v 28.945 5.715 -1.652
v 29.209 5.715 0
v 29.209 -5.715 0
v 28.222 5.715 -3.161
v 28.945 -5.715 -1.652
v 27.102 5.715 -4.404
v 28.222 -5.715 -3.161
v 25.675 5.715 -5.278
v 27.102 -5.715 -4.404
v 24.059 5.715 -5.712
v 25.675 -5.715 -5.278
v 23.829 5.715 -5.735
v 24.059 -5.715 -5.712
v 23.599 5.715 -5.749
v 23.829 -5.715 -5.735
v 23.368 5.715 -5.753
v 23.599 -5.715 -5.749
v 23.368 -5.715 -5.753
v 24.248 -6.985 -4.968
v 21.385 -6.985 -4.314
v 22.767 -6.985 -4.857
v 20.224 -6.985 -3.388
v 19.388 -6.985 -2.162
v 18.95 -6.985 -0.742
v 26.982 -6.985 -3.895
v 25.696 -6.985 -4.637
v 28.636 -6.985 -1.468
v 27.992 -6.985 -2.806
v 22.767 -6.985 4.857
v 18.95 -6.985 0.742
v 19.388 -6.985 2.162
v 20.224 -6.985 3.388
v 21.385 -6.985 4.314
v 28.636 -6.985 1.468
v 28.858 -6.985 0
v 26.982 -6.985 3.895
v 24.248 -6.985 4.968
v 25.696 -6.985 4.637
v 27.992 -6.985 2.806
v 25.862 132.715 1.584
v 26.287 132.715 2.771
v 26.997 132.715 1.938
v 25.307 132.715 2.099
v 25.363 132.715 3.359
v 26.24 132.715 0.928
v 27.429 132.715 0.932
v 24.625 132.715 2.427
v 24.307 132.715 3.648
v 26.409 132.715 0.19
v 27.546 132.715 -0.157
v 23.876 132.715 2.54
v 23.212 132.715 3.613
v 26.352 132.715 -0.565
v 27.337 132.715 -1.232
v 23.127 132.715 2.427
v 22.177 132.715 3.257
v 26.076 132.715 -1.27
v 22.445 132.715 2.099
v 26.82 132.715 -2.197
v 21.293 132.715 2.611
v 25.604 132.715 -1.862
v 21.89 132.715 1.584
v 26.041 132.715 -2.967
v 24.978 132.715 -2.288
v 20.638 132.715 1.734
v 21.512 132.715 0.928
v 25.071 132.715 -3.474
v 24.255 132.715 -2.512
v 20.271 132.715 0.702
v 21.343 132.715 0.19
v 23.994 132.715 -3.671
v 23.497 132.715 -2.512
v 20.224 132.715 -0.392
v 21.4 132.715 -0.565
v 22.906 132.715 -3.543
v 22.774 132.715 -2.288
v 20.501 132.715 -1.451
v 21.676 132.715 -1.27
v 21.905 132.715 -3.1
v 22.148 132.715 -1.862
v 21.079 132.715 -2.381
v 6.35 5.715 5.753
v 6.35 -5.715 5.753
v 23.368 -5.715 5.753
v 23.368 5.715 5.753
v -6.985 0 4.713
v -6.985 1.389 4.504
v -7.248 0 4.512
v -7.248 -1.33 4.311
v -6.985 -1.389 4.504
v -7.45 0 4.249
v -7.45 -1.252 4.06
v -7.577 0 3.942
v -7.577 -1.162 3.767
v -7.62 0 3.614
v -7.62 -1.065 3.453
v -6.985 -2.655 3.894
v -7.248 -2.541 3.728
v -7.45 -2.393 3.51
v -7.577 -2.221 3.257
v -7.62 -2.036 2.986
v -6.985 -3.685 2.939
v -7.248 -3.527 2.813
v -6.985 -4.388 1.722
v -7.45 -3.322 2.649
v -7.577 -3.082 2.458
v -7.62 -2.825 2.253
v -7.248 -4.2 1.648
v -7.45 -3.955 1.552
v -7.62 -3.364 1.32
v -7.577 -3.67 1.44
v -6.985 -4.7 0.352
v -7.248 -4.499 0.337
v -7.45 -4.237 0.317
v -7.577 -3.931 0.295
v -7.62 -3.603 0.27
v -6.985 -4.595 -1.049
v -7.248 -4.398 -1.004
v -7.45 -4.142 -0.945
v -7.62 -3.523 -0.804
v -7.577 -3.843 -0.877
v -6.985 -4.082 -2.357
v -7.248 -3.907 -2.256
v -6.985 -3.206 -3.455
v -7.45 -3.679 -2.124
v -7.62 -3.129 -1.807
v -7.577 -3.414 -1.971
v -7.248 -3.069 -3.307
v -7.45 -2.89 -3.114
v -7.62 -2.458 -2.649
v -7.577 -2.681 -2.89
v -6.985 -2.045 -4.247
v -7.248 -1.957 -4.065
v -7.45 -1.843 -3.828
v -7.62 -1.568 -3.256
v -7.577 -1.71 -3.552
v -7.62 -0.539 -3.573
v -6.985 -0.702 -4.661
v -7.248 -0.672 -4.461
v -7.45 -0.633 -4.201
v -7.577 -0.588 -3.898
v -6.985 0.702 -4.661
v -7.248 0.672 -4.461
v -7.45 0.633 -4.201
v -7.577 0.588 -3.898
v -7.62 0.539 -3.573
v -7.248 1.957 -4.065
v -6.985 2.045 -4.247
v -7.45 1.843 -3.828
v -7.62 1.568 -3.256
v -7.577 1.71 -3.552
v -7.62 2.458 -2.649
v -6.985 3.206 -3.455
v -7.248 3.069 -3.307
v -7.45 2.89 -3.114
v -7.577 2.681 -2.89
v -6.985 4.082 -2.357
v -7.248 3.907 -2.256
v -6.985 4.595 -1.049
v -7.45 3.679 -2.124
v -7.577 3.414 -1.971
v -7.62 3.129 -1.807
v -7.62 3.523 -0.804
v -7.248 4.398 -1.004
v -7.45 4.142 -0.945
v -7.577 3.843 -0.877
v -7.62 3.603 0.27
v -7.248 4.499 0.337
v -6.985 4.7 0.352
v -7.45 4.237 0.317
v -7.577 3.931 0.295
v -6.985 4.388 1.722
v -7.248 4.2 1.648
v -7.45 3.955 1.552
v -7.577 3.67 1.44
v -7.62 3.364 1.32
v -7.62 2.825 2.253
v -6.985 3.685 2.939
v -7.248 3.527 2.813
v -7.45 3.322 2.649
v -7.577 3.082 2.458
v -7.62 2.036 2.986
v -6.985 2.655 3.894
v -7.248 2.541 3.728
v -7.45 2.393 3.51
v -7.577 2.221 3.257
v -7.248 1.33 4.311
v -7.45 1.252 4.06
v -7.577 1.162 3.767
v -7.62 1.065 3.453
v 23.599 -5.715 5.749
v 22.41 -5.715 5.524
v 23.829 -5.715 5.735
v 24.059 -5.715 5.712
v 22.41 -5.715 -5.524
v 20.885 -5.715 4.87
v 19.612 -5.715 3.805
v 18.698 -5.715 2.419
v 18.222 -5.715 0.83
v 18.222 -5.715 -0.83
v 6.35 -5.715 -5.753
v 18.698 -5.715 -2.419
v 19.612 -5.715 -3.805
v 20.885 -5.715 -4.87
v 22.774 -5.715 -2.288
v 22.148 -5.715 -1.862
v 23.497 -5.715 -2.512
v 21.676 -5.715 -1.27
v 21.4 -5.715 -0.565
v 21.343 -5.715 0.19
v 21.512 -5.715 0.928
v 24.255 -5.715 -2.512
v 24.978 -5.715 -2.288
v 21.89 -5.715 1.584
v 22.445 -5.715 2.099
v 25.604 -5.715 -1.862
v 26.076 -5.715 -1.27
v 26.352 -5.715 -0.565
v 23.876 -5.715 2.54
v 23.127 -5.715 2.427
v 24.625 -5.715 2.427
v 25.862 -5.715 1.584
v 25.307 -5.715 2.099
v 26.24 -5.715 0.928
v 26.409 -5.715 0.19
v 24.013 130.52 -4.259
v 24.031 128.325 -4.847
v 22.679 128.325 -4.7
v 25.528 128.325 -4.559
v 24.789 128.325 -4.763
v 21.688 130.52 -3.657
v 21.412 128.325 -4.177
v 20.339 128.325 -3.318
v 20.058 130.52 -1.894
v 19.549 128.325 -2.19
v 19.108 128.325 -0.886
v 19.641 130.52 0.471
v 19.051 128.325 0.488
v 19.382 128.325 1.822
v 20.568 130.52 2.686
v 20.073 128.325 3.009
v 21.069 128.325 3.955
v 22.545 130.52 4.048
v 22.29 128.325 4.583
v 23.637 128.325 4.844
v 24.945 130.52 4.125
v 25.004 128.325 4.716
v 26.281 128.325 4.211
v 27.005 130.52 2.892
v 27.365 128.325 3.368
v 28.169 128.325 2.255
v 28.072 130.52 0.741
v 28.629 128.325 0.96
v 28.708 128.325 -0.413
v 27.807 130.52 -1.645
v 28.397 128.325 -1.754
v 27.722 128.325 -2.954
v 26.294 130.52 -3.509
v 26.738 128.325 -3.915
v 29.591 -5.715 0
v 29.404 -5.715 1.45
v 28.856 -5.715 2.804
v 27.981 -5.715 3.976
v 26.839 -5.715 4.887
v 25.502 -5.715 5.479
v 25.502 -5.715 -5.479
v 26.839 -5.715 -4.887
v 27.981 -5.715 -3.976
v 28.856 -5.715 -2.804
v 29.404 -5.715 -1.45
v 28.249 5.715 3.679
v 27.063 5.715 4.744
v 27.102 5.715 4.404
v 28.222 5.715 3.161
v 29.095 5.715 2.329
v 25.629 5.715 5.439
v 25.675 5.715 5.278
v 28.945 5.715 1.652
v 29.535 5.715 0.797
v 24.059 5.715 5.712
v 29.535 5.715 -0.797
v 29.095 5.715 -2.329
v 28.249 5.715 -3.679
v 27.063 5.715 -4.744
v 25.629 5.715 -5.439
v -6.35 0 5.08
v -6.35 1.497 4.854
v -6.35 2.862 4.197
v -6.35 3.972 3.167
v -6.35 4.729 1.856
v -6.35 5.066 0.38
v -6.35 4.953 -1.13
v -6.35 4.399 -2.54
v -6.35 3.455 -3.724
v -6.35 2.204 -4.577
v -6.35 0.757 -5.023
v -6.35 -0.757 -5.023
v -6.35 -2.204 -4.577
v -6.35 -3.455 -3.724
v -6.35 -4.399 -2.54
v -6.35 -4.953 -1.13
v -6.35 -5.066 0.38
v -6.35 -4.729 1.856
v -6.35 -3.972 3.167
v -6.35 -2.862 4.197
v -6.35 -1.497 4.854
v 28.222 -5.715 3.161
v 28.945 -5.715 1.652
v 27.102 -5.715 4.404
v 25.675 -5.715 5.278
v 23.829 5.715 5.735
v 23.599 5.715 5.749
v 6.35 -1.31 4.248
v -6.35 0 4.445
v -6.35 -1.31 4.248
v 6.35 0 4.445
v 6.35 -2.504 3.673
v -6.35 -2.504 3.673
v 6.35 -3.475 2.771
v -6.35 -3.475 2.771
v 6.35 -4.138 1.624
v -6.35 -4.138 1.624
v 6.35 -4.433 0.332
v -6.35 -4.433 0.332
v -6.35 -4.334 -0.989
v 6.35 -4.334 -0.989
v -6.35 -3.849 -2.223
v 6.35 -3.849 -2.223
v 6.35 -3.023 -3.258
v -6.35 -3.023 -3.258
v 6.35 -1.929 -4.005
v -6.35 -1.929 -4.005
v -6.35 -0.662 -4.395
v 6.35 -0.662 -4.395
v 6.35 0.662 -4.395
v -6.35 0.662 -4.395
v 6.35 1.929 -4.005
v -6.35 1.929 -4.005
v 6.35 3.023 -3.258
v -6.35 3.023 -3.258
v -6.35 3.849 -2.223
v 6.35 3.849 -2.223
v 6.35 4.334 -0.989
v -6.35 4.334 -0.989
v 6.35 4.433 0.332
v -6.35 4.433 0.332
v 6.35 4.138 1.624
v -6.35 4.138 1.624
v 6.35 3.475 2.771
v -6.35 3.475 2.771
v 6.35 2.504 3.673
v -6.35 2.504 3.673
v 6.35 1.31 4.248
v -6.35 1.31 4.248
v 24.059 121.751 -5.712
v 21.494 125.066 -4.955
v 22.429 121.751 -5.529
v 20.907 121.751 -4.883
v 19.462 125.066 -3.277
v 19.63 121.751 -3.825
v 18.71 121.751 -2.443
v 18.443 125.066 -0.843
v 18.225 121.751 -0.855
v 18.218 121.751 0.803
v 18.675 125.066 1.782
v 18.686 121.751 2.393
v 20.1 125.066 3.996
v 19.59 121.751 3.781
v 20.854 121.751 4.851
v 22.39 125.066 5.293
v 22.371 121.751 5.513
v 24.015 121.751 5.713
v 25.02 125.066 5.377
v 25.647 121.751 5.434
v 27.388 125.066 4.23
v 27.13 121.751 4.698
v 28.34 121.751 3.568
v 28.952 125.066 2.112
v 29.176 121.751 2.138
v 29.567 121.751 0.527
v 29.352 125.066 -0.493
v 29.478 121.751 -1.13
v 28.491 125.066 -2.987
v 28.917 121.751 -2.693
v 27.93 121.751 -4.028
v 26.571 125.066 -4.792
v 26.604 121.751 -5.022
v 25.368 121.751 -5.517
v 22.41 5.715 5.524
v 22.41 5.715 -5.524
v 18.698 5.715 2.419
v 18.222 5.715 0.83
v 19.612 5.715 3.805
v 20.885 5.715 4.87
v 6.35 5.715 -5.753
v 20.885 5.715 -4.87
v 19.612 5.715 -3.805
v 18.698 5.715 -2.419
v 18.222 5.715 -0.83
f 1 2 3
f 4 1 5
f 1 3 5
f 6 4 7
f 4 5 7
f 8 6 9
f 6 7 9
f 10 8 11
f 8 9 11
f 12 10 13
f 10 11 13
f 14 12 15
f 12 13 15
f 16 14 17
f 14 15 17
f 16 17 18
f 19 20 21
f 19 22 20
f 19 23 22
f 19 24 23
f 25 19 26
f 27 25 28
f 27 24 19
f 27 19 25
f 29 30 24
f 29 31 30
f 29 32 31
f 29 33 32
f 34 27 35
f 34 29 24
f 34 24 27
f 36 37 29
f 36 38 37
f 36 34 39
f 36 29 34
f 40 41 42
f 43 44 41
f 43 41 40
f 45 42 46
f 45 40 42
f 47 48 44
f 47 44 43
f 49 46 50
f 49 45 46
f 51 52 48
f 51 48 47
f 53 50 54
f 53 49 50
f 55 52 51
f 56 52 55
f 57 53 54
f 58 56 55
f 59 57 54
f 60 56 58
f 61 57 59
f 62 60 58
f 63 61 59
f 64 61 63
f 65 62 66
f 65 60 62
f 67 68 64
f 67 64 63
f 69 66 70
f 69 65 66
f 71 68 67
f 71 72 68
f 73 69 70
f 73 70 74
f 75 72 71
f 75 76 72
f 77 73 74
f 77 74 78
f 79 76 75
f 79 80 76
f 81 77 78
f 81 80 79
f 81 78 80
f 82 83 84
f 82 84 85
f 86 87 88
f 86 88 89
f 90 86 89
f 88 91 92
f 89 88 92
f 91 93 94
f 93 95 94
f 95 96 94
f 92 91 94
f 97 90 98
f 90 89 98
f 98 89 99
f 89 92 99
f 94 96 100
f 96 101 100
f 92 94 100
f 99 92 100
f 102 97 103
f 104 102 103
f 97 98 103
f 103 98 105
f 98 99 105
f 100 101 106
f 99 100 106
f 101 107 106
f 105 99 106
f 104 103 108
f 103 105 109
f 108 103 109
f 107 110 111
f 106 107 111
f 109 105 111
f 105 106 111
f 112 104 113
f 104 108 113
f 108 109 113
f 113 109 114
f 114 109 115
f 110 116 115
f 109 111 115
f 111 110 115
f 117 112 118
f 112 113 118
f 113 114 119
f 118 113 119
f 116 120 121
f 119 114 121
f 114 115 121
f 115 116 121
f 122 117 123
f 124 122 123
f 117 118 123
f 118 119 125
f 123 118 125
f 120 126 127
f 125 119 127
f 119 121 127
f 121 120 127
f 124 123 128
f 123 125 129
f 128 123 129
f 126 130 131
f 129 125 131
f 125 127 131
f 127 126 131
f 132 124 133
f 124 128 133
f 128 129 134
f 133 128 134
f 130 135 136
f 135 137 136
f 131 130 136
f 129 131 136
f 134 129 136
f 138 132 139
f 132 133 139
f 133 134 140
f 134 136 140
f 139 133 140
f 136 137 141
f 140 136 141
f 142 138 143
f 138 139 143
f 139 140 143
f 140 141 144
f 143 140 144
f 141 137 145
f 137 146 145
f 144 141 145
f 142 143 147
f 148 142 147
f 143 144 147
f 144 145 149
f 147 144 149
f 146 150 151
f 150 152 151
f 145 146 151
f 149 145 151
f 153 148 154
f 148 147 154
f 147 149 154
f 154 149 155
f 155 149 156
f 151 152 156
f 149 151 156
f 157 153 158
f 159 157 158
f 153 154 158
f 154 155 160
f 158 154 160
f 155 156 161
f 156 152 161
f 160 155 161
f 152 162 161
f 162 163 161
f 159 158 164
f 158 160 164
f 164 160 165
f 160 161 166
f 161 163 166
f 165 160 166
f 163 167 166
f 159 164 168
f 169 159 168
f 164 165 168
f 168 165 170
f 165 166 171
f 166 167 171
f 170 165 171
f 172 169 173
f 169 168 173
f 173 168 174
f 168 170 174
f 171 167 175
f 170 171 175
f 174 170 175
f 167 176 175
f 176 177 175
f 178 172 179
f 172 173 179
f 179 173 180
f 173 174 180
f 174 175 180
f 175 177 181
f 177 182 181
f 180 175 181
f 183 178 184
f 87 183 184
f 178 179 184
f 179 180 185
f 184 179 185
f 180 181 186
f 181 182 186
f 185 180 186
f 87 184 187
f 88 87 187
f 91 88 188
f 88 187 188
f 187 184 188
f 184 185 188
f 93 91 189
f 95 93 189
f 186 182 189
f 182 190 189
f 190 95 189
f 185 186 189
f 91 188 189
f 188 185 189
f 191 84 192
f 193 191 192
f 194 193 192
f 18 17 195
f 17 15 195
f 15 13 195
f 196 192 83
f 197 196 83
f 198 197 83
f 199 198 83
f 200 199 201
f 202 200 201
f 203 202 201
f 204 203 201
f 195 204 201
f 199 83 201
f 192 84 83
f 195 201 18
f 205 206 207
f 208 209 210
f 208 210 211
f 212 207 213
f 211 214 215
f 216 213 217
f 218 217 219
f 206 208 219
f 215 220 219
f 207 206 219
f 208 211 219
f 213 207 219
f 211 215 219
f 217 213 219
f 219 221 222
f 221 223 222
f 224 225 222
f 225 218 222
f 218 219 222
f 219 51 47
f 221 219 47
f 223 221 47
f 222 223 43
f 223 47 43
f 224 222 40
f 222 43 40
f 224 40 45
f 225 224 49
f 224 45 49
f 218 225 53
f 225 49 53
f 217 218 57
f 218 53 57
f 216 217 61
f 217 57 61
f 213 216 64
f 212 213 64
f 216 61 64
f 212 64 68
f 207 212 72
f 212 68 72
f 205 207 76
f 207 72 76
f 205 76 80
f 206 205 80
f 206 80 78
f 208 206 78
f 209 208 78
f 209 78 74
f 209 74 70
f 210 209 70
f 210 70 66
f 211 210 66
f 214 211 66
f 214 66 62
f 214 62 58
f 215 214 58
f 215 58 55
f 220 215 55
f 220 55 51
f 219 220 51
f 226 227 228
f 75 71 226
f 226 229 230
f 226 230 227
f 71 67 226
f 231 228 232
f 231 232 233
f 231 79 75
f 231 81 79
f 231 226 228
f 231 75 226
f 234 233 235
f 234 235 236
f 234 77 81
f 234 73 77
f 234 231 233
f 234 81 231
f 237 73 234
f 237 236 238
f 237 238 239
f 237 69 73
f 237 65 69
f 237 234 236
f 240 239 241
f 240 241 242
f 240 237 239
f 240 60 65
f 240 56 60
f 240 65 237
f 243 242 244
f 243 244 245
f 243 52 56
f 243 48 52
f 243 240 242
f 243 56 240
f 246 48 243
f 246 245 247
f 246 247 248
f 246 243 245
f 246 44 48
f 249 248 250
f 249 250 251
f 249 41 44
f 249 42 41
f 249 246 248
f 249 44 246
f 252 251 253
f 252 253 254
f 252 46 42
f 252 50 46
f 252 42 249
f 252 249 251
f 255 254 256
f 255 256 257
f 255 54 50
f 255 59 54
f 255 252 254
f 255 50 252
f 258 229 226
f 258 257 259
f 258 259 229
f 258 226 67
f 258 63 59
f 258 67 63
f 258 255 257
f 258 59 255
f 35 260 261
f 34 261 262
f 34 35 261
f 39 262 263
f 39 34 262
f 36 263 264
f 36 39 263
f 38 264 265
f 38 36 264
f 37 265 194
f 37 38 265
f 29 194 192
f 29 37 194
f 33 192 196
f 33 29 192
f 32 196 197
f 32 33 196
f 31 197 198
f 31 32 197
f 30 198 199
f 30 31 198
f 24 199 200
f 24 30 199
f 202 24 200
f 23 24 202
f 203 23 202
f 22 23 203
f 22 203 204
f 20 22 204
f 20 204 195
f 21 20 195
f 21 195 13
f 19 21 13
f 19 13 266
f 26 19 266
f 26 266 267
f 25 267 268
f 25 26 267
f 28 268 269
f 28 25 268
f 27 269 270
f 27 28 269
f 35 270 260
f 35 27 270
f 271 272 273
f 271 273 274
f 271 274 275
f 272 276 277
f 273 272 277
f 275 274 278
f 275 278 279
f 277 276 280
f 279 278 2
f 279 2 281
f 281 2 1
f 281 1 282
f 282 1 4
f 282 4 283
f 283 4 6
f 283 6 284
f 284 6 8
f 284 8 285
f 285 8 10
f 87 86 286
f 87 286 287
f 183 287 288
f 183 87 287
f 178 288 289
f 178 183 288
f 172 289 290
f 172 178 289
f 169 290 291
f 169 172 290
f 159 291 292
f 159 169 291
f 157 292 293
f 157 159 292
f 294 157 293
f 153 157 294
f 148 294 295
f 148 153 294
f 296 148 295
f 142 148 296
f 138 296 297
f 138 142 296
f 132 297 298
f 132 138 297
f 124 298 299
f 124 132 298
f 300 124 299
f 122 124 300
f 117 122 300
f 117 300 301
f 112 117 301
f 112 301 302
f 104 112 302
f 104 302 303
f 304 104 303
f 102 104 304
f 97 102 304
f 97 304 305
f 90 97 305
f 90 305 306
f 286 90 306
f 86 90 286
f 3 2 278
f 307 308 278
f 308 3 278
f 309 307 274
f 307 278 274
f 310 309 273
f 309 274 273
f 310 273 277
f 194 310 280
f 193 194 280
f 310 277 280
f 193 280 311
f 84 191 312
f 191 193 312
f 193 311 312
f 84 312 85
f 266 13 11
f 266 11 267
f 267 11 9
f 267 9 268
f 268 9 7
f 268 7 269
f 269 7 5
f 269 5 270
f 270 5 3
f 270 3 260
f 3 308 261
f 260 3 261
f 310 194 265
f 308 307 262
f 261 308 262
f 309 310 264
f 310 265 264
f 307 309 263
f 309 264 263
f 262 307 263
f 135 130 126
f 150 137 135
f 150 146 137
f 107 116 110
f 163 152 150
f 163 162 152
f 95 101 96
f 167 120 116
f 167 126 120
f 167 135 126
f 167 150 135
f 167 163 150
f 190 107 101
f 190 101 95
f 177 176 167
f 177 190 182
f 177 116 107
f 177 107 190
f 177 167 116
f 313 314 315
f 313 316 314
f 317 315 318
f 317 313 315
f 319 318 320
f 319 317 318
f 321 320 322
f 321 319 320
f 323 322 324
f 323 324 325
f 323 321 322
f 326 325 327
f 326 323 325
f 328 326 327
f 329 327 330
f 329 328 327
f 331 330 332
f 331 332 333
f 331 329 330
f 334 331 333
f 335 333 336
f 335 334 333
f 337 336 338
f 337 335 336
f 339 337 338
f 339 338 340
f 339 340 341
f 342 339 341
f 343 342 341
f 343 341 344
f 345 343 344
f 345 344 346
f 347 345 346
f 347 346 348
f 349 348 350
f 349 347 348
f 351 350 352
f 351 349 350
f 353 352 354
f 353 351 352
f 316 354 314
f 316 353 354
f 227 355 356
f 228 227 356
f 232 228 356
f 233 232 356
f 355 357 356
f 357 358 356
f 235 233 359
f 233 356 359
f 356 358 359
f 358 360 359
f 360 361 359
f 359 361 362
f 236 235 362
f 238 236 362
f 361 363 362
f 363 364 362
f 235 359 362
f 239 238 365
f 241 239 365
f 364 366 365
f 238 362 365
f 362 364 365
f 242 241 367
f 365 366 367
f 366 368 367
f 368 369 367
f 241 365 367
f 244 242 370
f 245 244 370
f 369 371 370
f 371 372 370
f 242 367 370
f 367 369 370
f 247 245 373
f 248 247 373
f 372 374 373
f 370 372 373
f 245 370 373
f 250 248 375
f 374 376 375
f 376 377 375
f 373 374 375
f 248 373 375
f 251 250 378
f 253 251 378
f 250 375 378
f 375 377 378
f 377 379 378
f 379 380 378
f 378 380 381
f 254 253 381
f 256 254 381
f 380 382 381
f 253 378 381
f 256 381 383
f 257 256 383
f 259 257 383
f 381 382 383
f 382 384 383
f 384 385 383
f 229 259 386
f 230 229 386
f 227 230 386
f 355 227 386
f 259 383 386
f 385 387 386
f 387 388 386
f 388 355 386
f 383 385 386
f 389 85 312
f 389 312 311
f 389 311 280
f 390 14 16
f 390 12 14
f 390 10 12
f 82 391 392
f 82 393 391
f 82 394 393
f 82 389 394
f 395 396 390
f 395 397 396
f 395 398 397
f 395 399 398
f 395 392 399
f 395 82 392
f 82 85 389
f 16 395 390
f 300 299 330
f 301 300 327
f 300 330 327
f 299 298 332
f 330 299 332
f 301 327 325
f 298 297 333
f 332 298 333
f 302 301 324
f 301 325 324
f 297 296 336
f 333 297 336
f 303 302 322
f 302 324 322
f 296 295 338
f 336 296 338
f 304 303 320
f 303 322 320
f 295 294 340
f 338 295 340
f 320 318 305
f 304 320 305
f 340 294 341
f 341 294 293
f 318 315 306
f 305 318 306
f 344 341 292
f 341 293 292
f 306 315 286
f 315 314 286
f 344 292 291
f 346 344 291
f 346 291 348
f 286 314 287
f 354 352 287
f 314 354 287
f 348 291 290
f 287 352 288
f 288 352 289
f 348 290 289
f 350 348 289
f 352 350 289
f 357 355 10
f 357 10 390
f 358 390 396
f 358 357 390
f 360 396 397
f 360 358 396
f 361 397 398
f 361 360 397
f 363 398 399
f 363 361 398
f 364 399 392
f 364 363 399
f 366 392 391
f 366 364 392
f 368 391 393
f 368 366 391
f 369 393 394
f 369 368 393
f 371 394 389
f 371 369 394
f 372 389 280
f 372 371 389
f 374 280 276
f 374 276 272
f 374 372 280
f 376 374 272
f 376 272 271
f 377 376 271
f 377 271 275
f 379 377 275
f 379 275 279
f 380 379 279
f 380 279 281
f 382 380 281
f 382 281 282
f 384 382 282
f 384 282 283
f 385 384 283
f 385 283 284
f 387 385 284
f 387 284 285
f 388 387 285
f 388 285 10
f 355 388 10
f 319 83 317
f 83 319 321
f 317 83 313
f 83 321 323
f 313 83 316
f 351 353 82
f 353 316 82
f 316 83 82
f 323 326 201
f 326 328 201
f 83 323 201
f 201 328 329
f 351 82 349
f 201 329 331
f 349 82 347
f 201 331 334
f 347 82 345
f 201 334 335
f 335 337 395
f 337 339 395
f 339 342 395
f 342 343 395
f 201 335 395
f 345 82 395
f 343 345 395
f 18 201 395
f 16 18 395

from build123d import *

# Parameters (mm, degrees)
SKETCH2_R           = 4.445
BOSS_EXTRUDE1_DEPTH = 6.35
SKETCH3_R           = 5.08
BOSS_EXTRUDE2_DEPTH = 1.27
BOSS_EXTRUDE2_TAPER = 30
FILLET1_R           = 1.27
SKETCH5_W           = 11.5062
SKETCH5_H           = 11.43
BOSS_EXTRUDE4_DEPTH = 22.86
CUT_EXTRUDE1_REACH  = 33.89
SKETCH6_R           = 2.54
FILLET2_R           = 5.842
SKETCH7_R           = 5.715
BOSS_EXTRUDE5_DEPTH = 1.27
BOSS_EXTRUDE5_TAPER = 30
BOSS_EXTRUDE6_START = 127
SKETCH8_R           = 5.715
SKETCH8_R_2         = 2.54
BOSS_EXTRUDE6_DEPTH = 127
CHAMFER1_SIZE       = 7.62
CHAMFER1_SIZE2      = 2.041772846
FILLET3_R           = 25.4


with BuildPart() as part:
    # Sketch2 → Boss-Extrude1 (new, symmetric)
    with BuildSketch(Plane(origin=(0, 0, 0), x_dir=(0, 0, -1), z_dir=(1, 0, 0))):
        with Locations(Location((0, 0, 0), (0, 0, 180))):
            Circle(SKETCH2_R)
    extrude(amount=BOSS_EXTRUDE1_DEPTH, both=True)

    # Sketch3 → Boss-Extrude2 (add)
    with BuildSketch(Plane.ZY.offset(6.35)):
        Circle(SKETCH3_R)
    extrude(amount=BOSS_EXTRUDE2_DEPTH, taper=BOSS_EXTRUDE2_TAPER)

    # Fillet1
    fillet1_edges = [part.edges().sort_by_distance(p)[0] for p in [
        (-7.62, 0, -4.346765158),
    ]]
    fillet(fillet1_edges, radius=FILLET1_R)

    # Sketch5 → Boss-Extrude4 (add)
    with BuildSketch(Plane(origin=(6.35, 0, 0), x_dir=(0, 0, -1), z_dir=(1, 0, 0))):
        Rectangle(SKETCH5_W, SKETCH5_H)
    extrude(amount=BOSS_EXTRUDE4_DEPTH)

    # Sketch6 → Cut-Extrude1 (cut, up to next)
    with BuildSketch(Plane(origin=(0, 5.715, 0), x_dir=(1, 0, 0), z_dir=(0, 1, 0)), mode=Mode.PRIVATE) as cut_extrude1_sk1:
        with Locations(Location((23.876, 0, 0), (0, 0, 270))):
            Circle(SKETCH6_R)
    cut_extrude1_tool1 = extrude(cut_extrude1_sk1.sketch, amount=-CUT_EXTRUDE1_REACH, mode=Mode.PRIVATE) & part.part
    add(cut_extrude1_tool1.solids().sort_by_distance((23.876, 5.715, 0))[0], mode=Mode.SUBTRACT)

    # Fillet2
    # the kernel refuses this fillet: 5.842 mm, written as the material it takes off along each edge
    with BuildSketch(Plane(origin=(29.21, -20.32, -5.7531), x_dir=(0, 0, 1), z_dir=(0, 1, 0))) as fillet2_piece_1:
        with BuildLine():
            CenterArc((FILLET2_R, -FILLET2_R), FILLET2_R, 90, 90)
            Line((0, -FILLET2_R), (0, 0))
            Line((0, 0), (FILLET2_R, 0))
        make_face()
    extrude(amount=40.64, mode=Mode.SUBTRACT)
    with BuildSketch(Plane(origin=(29.21, 20.32, 5.7531), x_dir=(-1, 0, 0), z_dir=(0, -1, 0))) as fillet2_piece_2:
        with BuildLine():
            CenterArc((FILLET2_R, FILLET2_R), FILLET2_R, 180, 90)
            Line((0, FILLET2_R), (0, 0))
            Line((0, 0), (FILLET2_R, 0))
        make_face()
    extrude(amount=40.64, mode=Mode.SUBTRACT)

    # Sketch7 → Boss-Extrude5 (add)
    with BuildSketch(Plane.XZ.offset(5.715)):
        with Locations((23.876, 0)):
            Circle(SKETCH7_R)
    extrude(amount=BOSS_EXTRUDE5_DEPTH, taper=BOSS_EXTRUDE5_TAPER)

    # Sketch8 → Boss-Extrude6 (add)
    with BuildSketch(Plane(origin=(0, 5.715, 0), x_dir=(1, 0, 0), z_dir=(0, 1, 0)).offset(BOSS_EXTRUDE6_START)):
        with Locations(Location((23.876, 0, 0), (0, 0, 88.162656718))):
            Circle(SKETCH8_R)
        with Locations(Location((23.876, 0, 0), (0, 0, 270))):
            Circle(SKETCH8_R_2, mode=Mode.SUBTRACT)
    extrude(amount=-BOSS_EXTRUDE6_DEPTH)

    # Chamfer1
    chamfer1_edges = [part.edges().sort_by_distance(p)[0] for p in [
        (23.692764561, 132.715, 5.71206178),
    ]]
    chamfer1_side = [part.faces().sort_by_distance(p)[0] for p in [
        (23.692764561, 69.215, 5.71206178),
    ]]
    chamfer(chamfer1_edges, length=CHAMFER1_SIZE, length2=CHAMFER1_SIZE2, reference=chamfer1_side[0])

    # Fillet3
    fillet3_edges = [part.edges().sort_by_distance(p)[0] for p in [
        (23.692764561, 125.095, 5.71206178),
    ]]
    fillet(fillet3_edges, radius=FILLET3_R)


solid = part.part
